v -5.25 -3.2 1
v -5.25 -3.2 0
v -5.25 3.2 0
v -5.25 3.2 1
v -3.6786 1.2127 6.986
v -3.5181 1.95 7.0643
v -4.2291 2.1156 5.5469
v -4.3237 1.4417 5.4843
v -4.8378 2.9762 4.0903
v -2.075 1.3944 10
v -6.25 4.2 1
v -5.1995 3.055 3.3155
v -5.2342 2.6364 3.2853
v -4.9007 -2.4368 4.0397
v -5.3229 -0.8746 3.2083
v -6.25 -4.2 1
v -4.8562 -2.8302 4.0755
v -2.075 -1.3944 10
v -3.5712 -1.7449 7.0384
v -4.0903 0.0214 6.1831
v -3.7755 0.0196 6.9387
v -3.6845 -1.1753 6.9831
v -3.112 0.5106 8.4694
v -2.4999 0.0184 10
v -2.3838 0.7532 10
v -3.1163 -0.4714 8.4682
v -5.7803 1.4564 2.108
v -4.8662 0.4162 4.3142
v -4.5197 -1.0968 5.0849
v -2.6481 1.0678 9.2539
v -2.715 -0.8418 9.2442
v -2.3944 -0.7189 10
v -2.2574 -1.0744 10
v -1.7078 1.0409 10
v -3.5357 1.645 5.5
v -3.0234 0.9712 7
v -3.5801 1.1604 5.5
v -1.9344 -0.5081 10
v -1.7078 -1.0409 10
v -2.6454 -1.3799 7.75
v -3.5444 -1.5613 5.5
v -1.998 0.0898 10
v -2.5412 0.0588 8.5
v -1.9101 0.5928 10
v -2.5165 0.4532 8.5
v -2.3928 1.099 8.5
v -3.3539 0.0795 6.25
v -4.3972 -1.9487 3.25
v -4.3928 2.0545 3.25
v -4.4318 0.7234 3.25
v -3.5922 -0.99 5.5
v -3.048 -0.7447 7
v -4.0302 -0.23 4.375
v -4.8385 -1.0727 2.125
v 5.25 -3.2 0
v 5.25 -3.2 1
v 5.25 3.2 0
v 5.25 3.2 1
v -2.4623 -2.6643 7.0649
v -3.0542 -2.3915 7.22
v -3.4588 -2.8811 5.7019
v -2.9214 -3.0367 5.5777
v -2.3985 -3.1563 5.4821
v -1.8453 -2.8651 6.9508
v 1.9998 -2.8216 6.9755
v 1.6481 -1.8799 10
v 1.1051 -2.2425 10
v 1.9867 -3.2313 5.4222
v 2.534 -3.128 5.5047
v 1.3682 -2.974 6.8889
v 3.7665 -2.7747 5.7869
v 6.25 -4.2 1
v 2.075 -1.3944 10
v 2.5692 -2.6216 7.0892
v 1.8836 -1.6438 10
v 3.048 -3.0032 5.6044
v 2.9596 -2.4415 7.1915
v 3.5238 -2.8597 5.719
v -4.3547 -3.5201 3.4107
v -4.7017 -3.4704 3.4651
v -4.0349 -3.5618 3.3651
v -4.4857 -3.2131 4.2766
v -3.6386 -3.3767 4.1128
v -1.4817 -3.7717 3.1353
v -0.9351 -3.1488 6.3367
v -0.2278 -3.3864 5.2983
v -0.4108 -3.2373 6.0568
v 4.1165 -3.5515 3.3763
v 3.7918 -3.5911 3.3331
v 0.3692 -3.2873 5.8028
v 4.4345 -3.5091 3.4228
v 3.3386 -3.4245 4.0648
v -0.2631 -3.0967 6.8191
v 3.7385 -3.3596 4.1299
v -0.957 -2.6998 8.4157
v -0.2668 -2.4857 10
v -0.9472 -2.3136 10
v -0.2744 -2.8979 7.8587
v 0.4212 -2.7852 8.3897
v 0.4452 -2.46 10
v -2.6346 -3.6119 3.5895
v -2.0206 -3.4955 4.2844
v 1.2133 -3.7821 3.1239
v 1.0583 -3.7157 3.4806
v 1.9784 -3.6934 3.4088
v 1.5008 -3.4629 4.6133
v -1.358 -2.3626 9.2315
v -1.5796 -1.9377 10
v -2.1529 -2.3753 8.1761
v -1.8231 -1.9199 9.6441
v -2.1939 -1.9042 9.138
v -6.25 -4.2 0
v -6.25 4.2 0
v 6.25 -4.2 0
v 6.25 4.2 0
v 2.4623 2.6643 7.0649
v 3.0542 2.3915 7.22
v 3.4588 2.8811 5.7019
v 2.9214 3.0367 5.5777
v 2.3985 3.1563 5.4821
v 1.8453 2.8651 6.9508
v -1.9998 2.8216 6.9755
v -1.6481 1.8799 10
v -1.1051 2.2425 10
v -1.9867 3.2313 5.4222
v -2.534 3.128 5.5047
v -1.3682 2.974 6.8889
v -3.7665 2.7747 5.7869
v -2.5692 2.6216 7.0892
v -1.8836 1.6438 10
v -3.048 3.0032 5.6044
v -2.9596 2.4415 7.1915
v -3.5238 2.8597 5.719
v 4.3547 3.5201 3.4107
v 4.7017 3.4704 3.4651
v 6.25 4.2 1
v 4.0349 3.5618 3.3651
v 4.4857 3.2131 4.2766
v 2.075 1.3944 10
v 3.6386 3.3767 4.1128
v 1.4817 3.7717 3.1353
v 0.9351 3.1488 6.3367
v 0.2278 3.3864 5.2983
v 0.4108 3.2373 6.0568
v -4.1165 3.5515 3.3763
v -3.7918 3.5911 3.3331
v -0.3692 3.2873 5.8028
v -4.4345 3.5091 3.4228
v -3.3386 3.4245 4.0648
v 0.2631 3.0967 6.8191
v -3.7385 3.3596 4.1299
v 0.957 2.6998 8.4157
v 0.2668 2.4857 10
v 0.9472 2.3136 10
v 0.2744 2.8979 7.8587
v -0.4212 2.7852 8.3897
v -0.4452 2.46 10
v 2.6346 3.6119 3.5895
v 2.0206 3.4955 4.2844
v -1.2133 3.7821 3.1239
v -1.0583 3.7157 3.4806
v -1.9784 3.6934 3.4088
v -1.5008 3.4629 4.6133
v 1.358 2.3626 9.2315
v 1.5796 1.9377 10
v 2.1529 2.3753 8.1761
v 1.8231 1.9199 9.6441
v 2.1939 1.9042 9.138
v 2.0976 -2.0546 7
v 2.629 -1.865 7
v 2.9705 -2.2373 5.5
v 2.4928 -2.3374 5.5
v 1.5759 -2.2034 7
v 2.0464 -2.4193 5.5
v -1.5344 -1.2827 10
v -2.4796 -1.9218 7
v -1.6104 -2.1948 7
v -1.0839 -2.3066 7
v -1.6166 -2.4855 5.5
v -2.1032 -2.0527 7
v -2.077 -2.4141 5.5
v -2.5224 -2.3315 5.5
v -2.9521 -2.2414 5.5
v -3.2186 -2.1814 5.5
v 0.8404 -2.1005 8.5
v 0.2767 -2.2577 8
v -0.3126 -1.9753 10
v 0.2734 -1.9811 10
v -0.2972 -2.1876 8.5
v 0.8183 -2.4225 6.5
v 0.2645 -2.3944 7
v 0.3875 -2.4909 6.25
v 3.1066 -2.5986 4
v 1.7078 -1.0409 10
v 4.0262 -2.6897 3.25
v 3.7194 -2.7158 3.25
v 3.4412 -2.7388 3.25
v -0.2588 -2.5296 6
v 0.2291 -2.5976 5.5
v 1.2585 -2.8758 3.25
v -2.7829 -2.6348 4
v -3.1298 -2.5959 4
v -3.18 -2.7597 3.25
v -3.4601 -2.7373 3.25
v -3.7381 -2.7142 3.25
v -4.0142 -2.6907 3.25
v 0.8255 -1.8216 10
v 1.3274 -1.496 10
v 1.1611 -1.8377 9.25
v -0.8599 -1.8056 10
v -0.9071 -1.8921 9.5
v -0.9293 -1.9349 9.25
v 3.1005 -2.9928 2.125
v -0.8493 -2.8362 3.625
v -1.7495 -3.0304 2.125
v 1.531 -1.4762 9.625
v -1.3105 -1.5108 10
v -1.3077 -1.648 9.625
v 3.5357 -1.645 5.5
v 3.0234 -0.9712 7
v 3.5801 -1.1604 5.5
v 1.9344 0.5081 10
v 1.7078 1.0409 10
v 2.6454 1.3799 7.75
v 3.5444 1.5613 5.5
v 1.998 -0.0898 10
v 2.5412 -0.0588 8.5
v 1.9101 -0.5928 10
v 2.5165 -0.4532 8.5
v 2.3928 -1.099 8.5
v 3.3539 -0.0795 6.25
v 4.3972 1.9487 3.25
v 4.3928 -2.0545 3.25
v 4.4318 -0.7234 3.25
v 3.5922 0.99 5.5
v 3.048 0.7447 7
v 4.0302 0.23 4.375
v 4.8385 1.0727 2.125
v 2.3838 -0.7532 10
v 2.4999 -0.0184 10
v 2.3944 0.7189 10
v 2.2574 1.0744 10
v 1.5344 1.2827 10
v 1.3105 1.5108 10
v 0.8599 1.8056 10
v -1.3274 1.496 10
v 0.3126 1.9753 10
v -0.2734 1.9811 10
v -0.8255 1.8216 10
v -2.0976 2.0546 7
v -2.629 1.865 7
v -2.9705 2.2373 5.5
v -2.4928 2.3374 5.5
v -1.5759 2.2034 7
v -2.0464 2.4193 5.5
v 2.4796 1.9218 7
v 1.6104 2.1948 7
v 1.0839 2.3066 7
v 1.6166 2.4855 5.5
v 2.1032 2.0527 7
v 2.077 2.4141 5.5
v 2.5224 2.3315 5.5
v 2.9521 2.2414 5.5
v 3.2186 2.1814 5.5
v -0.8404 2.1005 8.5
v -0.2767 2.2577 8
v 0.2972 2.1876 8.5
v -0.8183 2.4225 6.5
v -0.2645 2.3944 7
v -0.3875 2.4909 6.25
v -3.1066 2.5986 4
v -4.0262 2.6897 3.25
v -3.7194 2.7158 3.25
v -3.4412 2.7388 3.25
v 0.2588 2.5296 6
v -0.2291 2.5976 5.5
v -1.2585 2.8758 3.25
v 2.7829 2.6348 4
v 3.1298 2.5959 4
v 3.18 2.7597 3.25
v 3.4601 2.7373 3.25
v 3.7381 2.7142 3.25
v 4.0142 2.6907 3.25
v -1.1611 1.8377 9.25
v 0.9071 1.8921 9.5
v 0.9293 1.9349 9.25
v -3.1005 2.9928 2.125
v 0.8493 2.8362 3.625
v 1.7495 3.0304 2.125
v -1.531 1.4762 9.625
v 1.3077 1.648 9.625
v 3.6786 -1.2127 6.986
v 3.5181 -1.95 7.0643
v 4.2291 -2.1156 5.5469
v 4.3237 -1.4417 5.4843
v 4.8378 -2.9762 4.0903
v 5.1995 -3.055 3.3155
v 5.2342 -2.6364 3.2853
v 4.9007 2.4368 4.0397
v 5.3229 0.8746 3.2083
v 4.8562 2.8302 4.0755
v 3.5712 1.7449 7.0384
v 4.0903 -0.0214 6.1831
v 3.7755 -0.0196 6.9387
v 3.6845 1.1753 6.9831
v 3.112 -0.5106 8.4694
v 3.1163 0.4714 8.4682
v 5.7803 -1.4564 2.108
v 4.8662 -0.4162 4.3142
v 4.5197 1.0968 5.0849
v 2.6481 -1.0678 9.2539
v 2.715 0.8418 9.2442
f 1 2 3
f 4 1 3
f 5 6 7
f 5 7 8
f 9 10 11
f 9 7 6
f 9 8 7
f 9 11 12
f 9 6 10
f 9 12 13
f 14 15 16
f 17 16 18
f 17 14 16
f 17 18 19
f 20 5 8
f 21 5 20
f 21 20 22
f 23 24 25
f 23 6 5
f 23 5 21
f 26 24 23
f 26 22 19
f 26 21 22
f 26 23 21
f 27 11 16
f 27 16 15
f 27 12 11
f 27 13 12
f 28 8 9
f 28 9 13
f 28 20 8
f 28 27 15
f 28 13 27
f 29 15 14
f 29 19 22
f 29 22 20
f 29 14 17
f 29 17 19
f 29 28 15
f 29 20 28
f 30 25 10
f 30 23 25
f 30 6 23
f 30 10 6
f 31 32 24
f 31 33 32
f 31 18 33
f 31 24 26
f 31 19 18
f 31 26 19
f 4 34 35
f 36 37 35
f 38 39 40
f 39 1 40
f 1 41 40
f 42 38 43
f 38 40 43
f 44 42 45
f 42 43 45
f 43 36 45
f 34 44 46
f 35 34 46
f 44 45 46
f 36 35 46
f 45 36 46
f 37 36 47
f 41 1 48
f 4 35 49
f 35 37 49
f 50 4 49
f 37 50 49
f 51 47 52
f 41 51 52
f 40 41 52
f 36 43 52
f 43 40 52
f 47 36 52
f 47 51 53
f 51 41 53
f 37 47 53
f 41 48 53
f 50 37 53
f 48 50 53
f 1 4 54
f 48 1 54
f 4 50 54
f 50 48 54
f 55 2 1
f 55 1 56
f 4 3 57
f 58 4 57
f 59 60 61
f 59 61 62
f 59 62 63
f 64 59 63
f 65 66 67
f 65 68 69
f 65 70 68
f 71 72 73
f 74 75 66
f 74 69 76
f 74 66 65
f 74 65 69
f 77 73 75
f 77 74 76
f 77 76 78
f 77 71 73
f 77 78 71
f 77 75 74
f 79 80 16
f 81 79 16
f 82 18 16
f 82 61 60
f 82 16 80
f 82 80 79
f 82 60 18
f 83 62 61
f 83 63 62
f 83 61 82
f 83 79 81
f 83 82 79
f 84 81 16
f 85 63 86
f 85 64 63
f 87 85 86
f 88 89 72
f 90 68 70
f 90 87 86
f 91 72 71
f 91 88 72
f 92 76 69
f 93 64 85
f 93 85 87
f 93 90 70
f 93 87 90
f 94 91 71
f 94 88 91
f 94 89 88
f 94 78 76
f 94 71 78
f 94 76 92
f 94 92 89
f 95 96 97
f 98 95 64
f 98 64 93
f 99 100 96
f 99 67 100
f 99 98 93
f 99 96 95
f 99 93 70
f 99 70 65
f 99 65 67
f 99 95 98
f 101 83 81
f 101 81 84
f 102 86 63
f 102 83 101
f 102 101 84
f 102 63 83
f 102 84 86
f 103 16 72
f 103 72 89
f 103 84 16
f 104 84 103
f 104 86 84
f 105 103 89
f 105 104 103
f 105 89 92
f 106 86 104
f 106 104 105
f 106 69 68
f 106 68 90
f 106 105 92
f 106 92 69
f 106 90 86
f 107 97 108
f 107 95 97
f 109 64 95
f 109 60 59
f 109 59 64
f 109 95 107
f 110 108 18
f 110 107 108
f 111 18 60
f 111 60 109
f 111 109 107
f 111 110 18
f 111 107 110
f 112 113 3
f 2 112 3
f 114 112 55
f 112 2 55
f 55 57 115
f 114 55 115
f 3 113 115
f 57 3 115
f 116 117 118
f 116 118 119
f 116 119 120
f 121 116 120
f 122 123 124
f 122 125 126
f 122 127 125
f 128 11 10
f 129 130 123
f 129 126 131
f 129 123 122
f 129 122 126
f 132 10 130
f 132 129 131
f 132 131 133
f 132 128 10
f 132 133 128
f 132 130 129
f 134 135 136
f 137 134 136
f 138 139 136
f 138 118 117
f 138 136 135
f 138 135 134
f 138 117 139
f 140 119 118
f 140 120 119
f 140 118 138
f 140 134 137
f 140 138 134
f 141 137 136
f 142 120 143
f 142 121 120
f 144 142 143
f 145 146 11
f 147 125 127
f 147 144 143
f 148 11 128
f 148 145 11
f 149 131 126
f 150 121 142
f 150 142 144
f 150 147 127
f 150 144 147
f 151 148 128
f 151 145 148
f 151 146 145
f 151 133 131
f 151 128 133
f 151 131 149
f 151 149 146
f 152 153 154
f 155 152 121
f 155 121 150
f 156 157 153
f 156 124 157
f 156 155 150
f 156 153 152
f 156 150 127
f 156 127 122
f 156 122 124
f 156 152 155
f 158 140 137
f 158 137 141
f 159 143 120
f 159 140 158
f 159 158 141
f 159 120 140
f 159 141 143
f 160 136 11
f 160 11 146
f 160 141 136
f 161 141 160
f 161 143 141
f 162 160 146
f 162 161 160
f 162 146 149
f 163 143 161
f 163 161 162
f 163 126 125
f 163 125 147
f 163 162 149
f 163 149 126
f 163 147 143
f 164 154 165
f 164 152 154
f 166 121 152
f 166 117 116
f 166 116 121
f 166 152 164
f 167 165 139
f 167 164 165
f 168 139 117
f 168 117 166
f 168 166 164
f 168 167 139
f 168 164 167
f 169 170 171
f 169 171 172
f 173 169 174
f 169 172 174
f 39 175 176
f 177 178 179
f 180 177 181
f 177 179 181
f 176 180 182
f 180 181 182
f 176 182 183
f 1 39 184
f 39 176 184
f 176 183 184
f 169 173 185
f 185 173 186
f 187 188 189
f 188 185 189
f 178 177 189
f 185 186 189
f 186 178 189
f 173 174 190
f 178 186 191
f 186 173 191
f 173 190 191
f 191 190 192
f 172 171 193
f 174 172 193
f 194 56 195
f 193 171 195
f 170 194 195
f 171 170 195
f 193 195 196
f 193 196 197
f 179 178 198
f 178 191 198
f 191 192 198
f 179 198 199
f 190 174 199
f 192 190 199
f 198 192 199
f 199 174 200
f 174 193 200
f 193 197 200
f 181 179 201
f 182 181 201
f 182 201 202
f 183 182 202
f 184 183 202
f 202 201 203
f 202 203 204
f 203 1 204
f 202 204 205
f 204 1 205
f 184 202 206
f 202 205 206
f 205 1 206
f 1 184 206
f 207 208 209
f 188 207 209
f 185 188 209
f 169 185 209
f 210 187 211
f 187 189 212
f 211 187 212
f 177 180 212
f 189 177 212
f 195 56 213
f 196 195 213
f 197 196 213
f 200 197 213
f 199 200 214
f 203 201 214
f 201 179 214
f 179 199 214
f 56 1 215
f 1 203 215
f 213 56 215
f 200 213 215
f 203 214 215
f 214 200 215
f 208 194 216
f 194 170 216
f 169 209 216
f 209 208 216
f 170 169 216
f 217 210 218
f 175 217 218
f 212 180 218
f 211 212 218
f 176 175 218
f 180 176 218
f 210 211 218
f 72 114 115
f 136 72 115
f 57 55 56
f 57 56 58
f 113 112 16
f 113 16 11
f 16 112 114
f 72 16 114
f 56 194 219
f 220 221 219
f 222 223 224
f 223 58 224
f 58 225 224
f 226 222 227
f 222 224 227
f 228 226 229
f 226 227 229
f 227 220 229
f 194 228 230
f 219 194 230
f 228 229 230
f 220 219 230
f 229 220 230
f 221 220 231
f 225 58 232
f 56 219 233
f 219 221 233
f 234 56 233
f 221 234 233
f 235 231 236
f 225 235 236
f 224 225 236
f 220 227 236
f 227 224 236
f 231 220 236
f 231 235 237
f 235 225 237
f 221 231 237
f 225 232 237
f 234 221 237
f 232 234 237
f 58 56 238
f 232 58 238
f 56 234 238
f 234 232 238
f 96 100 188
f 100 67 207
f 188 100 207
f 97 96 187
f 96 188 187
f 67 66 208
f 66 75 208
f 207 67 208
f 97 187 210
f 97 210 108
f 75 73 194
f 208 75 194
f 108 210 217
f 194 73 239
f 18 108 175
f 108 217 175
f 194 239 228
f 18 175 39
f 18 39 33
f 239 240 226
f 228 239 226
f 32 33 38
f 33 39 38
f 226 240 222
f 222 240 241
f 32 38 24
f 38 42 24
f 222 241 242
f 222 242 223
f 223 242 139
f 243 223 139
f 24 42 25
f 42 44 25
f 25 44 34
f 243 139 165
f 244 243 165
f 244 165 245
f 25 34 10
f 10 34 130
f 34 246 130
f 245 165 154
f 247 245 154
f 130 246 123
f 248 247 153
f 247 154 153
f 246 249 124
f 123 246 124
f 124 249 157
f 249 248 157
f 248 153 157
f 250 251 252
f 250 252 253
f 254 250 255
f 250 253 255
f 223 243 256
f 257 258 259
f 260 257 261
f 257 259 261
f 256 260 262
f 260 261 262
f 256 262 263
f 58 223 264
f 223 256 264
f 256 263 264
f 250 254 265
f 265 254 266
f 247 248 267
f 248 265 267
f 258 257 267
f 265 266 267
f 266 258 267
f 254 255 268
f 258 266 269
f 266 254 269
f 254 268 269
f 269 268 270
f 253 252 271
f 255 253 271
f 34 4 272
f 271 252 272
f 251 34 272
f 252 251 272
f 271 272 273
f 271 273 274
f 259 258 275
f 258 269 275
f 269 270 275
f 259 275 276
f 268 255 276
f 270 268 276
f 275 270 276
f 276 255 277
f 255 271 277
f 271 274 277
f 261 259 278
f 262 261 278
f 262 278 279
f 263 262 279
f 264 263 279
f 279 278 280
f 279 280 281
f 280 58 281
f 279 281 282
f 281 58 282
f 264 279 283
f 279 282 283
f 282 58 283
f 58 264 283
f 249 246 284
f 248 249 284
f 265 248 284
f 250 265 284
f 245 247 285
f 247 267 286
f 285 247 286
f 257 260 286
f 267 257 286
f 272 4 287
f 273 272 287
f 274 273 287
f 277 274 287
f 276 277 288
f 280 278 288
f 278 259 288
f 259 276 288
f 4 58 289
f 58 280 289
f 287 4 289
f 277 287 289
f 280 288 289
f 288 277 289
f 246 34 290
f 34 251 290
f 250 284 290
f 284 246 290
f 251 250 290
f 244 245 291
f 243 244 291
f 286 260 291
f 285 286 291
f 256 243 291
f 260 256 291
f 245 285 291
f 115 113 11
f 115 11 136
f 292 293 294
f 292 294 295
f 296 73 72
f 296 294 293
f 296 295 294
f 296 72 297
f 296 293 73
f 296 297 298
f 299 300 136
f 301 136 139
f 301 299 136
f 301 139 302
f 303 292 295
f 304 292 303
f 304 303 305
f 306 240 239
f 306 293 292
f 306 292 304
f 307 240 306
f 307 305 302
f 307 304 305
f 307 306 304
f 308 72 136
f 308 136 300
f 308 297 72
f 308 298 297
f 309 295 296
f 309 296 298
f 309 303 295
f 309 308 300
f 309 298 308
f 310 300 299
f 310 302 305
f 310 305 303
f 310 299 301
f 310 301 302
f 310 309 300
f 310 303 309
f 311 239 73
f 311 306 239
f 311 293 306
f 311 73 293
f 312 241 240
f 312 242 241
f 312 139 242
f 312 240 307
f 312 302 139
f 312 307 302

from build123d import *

# Parameters (mm, degrees)
SKETCH1_W           = 12.5
SKETCH1_H           = 8.4
SKETCH1_W_2         = 10.5
SKETCH1_H_2         = 6.4
BOSS_EXTRUDE1_DEPTH = 1


with BuildPart() as part:
    # Sketch1 → Boss-Extrude1 (new body)
    with BuildSketch(Plane.XY):
        Rectangle(SKETCH1_W, SKETCH1_H)
        Rectangle(SKETCH1_W_2, SKETCH1_H_2, mode=Mode.SUBTRACT)
    extrude(amount=BOSS_EXTRUDE1_DEPTH)

    # Sketch3 → Loft1 section 0
    with BuildSketch(Plane.XY.offset(1)):
        with BuildLine():
            Line((6.25, -4.2), (6.25, 4.2))
            Line((6.25, 4.2), (-6.25, 4.2))
            Line((-6.25, 4.2), (-6.25, -4.2))
            Line((-6.25, -4.2), (6.25, -4.2))
        make_face()
    # Sketch2 for Loft1 → Loft1 section 1
    with BuildSketch(Plane.XY.offset(10)):
        with BuildLine():
            # circular arc as an exact rational Bezier (weights 1, cos(half-angle), 1)
            Bezier((2.075003924, -1.394402637), (3.012042497, 0), (2.075003924, 1.394402637), weights=[1, 0.830001569, 1])
            Bezier((2.075003924, 1.394402637), (0, 4.482206096), (-2.075003924, 1.394402637), weights=[1, 0.557761055, 1])
            Bezier((-2.075003924, 1.394402637), (-3.012042497, 0), (-2.075003924, -1.394402637), weights=[1, 0.830001569, 1])
            Bezier((-2.075003924, -1.394402637), (0, -4.482206096), (2.075003924, -1.394402637), weights=[1, 0.557761055, 1])
        make_face()
    loft()

    # Cut-Loft1: read off the stored shape, not the designer's step
    # Cut-Loft1: loft between two sections, ruled curve by curve
    cut_loft1_from = [
        Edge.make_bspline([(1.707768655, -1.040925656, 10), (1.633699479, -1.162445397, 10), (1.542008876, -1.28354475, 10), (1.31984949, -1.511051231, 10), (1.189256111, -1.617336715, 10), (0.892947872, -1.797985608, 10), (0.72722112, -1.87212471, 10), (0.374256765, -1.973229171, 10), (0.187198335, -2, 10), (-0.187198335, -2, 10), (-0.374256765, -1.973229171, 10), (-0.72722112, -1.87212471, 10), (-0.892947872, -1.797985608, 10), (-1.189256111, -1.617336715, 10), (-1.31984949, -1.511051231, 10), (-1.542008876, -1.28354475, 10), (-1.633699479, -1.162445397, 10), (-1.707768655, -1.040925656, 10)], [0, 0, 0, 0, 0.125, 0.125, 0.25, 0.25, 0.375, 0.375, 0.5, 0.5, 0.625, 0.625, 0.75, 0.75, 0.875, 0.875, 1, 1, 1, 1], 3),
        Edge.make_bspline([(-1.707768655, -1.040925656, 10), (-1.798062507, -0.892787306, 10), (-1.872174068, -0.727085204, 10), (-1.973239973, -0.374182636, 10), (-2, -0.187161202, 10), (-2, 0.187161202, 10), (-1.973239973, 0.374182636, 10), (-1.872174068, 0.727085204, 10), (-1.798062507, 0.892787306, 10), (-1.707768655, 1.040925656, 10)], [0, 0, 0, 0, 0.25, 0.25, 0.5, 0.5, 0.75, 0.75, 1, 1, 1, 1], 3),
        Edge.make_bspline([(1.707768655, 1.040925656, 10), (1.798062507, 0.892787306, 10), (1.872174068, 0.727085204, 10), (1.973239973, 0.374182636, 10), (2, 0.187161202, 10), (2, -0.187161202, 10), (1.973239973, -0.374182636, 10), (1.872174068, -0.727085204, 10), (1.798062507, -0.892787306, 10), (1.707768655, -1.040925656, 10)], [0, 0, 0, 0, 0.25, 0.25, 0.5, 0.5, 0.75, 0.75, 1, 1, 1, 1], 3),
        Edge.make_bspline([(-1.707768655, 1.040925656, 10), (-1.633699479, 1.162445397, 10), (-1.542008876, 1.28354475, 10), (-1.31984949, 1.511051231, 10), (-1.189256111, 1.617336715, 10), (-0.892947872, 1.797985608, 10), (-0.72722112, 1.87212471, 10), (-0.374256765, 1.973229171, 10), (-0.187198335, 2, 10), (0.187198335, 2, 10), (0.374256765, 1.973229171, 10), (0.72722112, 1.87212471, 10), (0.892947872, 1.797985608, 10), (1.189256111, 1.617336715, 10), (1.31984949, 1.511051231, 10), (1.542008876, 1.28354475, 10), (1.633699479, 1.162445397, 10), (1.707768655, 1.040925656, 10)], [0, 0, 0, 0, 0.125, 0.125, 0.25, 0.25, 0.375, 0.375, 0.5, 0.5, 0.625, 0.625, 0.75, 0.75, 0.875, 0.875, 1, 1, 1, 1], 3),
    ]
    cut_loft1_to = [
        Edge.make_bspline([(5.25, -3.2, 1), (4.8125, -3.2, 1), (4.375, -3.2, 1), (3.5, -3.2, 1), (3.0625, -3.2, 1), (2.1875, -3.2, 1), (1.75, -3.2, 1), (0.875, -3.2, 1), (0.4375, -3.2, 1), (-0.4375, -3.2, 1), (-0.875, -3.2, 1), (-1.75, -3.2, 1), (-2.1875, -3.2, 1), (-3.0625, -3.2, 1), (-3.5, -3.2, 1), (-4.375, -3.2, 1), (-4.8125, -3.2, 1), (-5.25, -3.2, 1)], [0, 0, 0, 0, 0.125, 0.125, 0.25, 0.25, 0.375, 0.375, 0.5, 0.5, 0.625, 0.625, 0.75, 0.75, 0.875, 0.875, 1, 1, 1, 1], 3),
        Edge.make_bspline([(-5.25, -3.2, 1), (-5.25, -2.666666667, 1), (-5.25, -2.133333333, 1), (-5.25, -1.066666667, 1), (-5.25, -0.533333333, 1), (-5.25, 0.533333333, 1), (-5.25, 1.066666667, 1), (-5.25, 2.133333333, 1), (-5.25, 2.666666667, 1), (-5.25, 3.2, 1)], [0, 0, 0, 0, 0.25, 0.25, 0.5, 0.5, 0.75, 0.75, 1, 1, 1, 1], 3),
        Edge.make_bspline([(5.25, 3.2, 1), (5.25, 2.666666667, 1), (5.25, 2.133333333, 1), (5.25, 1.066666667, 1), (5.25, 0.533333333, 1), (5.25, -0.533333333, 1), (5.25, -1.066666667, 1), (5.25, -2.133333333, 1), (5.25, -2.666666667, 1), (5.25, -3.2, 1)], [0, 0, 0, 0, 0.25, 0.25, 0.5, 0.5, 0.75, 0.75, 1, 1, 1, 1], 3),
        Edge.make_bspline([(-5.25, 3.2, 1), (-4.8125, 3.2, 1), (-4.375, 3.2, 1), (-3.5, 3.2, 1), (-3.0625, 3.2, 1), (-2.1875, 3.2, 1), (-1.75, 3.2, 1), (-0.875, 3.2, 1), (-0.4375, 3.2, 1), (0.4375, 3.2, 1), (0.875, 3.2, 1), (1.75, 3.2, 1), (2.1875, 3.2, 1), (3.0625, 3.2, 1), (3.5, 3.2, 1), (4.375, 3.2, 1), (4.8125, 3.2, 1), (5.25, 3.2, 1)], [0, 0, 0, 0, 0.125, 0.125, 0.25, 0.25, 0.375, 0.375, 0.5, 0.5, 0.625, 0.625, 0.75, 0.75, 0.875, 0.875, 1, 1, 1, 1], 3),
    ]
    cut_loft1 = Solid(Shell([*[Face.make_surface_from_curves(cut_loft1_from[k], cut_loft1_to[k]) for k in range(4)], Face(Wire(cut_loft1_from)), Face(Wire(cut_loft1_to))]))
    add(cut_loft1, mode=Mode.SUBTRACT)


solid = part.part
